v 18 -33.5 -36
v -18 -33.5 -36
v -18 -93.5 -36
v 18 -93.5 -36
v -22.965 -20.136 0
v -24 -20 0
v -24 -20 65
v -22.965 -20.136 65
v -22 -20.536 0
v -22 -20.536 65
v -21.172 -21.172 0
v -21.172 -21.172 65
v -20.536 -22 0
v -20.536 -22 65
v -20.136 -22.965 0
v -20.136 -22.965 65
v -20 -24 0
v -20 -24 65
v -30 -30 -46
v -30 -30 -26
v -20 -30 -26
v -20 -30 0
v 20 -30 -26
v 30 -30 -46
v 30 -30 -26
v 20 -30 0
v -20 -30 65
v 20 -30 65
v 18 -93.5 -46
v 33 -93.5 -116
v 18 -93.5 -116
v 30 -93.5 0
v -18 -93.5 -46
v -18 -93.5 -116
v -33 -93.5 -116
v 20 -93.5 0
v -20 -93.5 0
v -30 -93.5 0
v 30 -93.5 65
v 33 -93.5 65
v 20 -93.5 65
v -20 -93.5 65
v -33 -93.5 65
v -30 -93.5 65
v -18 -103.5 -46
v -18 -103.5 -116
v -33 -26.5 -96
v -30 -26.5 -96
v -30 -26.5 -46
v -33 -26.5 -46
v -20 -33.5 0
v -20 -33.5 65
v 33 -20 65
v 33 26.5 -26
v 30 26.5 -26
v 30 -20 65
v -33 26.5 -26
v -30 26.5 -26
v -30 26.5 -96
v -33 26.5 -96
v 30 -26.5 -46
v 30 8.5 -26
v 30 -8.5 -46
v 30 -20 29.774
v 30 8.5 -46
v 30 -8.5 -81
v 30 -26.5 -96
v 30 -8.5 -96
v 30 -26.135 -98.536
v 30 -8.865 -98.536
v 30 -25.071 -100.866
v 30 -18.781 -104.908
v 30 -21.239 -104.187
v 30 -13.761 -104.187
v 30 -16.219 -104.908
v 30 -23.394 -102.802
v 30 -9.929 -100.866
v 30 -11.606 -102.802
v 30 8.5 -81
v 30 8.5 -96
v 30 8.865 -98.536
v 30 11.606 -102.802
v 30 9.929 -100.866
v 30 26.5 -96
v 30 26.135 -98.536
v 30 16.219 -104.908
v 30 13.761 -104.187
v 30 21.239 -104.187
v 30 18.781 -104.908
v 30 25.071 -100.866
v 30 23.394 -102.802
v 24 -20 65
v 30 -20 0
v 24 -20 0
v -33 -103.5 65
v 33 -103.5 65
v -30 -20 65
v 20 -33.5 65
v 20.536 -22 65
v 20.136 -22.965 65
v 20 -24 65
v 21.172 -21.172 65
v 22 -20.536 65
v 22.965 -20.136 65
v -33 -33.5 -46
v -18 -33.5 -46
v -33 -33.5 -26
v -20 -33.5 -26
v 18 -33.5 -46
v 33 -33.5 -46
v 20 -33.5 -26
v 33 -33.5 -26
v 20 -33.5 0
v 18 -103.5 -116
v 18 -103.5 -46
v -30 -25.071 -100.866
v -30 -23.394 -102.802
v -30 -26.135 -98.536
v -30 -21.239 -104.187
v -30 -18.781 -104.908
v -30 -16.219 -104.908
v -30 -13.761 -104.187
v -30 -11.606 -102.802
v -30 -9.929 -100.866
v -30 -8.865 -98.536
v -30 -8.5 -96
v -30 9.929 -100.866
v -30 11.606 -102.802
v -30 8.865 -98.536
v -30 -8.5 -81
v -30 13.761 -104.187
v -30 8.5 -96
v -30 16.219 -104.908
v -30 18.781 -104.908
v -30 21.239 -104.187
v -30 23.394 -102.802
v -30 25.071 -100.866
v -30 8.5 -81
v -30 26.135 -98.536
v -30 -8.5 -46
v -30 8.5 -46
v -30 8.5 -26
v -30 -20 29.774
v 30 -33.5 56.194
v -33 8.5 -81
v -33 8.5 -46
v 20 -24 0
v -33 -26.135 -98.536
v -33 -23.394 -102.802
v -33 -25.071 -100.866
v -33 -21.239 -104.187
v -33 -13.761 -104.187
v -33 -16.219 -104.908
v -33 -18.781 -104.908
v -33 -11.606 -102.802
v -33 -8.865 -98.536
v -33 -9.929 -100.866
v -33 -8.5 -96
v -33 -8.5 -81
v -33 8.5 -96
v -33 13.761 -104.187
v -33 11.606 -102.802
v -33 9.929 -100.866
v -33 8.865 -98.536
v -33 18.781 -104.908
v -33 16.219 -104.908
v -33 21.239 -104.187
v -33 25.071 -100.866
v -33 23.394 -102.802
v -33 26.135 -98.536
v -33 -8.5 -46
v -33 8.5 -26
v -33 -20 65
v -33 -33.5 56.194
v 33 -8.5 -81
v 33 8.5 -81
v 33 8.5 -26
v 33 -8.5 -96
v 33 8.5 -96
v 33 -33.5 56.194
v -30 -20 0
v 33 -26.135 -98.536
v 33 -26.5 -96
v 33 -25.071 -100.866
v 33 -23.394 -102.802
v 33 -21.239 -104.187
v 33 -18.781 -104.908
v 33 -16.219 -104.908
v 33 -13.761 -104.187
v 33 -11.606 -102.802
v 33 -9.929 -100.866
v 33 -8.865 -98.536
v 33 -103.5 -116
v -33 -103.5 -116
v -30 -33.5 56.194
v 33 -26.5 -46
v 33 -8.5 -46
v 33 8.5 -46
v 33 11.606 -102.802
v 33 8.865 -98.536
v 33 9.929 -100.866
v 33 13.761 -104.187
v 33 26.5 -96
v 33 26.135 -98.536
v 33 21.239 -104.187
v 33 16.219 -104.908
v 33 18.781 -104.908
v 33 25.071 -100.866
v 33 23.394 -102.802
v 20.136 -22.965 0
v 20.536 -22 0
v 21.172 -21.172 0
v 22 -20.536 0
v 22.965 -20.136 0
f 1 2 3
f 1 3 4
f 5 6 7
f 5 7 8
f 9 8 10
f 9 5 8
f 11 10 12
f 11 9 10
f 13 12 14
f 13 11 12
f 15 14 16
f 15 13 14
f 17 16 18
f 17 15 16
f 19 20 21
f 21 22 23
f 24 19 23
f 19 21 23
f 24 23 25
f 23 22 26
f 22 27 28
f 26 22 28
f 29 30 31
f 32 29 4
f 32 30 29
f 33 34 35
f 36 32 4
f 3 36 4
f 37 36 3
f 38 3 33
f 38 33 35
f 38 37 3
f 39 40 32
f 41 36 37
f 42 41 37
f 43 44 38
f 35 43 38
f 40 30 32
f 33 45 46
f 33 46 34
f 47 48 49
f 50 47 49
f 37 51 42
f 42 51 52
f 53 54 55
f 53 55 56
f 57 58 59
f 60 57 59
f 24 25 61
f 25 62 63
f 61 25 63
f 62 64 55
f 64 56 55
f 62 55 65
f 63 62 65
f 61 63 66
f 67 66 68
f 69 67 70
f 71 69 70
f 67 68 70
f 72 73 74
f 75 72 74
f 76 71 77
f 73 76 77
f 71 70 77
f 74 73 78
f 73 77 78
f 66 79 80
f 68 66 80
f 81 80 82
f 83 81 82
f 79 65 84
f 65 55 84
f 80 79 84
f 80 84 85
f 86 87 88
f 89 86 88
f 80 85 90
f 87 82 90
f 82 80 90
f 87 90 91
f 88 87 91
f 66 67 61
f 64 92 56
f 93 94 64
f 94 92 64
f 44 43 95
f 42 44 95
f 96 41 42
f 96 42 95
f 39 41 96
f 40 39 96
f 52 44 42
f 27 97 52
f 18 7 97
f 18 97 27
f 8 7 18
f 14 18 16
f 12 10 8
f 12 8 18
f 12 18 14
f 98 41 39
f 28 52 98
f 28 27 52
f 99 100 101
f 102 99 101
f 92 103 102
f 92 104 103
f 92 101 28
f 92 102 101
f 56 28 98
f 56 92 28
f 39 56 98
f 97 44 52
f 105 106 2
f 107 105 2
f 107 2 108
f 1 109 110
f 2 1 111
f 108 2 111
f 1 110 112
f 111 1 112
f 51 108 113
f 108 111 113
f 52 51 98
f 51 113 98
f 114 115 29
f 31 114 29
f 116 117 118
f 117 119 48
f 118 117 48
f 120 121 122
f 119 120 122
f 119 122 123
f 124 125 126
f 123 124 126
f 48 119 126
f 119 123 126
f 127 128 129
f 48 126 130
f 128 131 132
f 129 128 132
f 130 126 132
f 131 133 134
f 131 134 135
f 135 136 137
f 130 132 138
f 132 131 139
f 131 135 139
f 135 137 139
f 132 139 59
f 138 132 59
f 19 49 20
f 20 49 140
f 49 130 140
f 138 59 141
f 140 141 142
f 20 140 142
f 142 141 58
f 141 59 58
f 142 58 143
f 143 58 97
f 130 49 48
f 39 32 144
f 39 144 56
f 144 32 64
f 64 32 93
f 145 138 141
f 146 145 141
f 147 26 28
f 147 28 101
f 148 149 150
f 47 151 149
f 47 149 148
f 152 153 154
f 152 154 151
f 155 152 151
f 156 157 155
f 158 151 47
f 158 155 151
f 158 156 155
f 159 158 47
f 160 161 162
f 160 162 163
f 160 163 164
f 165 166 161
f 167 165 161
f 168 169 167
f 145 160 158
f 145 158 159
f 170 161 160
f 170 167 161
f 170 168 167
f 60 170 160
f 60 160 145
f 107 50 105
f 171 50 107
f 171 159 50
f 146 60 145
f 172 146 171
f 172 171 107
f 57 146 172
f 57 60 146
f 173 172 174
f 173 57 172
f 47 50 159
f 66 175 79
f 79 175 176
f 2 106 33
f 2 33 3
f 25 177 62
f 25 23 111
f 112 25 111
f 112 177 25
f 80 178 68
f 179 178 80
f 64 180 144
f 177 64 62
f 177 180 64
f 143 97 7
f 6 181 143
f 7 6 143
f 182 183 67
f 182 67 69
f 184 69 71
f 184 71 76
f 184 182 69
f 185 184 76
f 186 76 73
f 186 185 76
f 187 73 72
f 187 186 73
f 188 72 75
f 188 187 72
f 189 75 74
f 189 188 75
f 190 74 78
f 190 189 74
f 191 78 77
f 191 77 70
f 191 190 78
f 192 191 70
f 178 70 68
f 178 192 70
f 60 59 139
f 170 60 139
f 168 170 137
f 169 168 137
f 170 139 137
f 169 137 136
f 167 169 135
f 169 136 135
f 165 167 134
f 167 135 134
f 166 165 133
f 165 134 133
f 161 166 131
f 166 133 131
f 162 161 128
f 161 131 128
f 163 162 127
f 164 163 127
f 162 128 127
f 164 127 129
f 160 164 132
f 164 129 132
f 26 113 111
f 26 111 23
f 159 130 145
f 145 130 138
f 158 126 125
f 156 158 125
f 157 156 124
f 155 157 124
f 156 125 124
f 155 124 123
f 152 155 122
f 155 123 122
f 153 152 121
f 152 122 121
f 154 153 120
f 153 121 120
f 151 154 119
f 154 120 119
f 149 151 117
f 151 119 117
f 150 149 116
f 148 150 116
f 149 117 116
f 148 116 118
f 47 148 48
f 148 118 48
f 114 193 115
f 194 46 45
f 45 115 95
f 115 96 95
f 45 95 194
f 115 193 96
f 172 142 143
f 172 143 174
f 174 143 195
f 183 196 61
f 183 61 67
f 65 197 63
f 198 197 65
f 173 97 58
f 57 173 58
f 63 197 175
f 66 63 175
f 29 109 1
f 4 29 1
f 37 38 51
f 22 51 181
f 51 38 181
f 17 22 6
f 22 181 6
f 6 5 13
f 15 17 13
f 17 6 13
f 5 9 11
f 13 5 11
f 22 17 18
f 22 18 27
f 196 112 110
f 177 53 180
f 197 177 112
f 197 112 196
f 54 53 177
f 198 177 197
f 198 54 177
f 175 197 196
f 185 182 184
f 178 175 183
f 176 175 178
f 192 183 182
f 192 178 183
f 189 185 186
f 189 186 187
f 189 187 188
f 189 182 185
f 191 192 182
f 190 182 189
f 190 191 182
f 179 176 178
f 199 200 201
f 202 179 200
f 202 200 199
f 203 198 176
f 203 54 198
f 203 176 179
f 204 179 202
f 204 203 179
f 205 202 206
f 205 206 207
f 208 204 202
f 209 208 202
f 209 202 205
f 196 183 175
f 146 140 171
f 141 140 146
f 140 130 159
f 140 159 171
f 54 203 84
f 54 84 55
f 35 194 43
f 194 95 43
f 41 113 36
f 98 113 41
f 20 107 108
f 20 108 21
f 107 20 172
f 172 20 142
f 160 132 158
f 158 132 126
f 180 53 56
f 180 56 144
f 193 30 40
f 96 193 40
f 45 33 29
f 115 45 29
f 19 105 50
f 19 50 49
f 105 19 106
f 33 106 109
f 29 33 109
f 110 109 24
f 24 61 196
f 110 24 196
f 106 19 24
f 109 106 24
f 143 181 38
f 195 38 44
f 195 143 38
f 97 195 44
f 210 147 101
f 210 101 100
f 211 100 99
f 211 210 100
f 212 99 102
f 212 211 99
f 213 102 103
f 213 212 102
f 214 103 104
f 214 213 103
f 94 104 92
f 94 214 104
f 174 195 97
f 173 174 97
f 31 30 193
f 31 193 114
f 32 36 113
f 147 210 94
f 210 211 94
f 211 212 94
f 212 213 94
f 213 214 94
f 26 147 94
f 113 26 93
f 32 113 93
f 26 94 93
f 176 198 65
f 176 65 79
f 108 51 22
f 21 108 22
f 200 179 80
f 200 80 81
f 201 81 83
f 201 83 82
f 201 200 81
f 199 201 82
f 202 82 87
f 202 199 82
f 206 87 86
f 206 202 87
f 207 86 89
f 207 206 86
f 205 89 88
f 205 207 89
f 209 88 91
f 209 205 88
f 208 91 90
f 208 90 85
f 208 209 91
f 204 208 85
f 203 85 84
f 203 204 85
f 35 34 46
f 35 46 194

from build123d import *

# Parameters (mm, degrees)
SKETCH_1_W      = 60
SKETCH_1_H      = 3
EXTRUDE_1_DEPTH = 65
SKETCH_2_W      = 40
SKETCH_2_H      = 3.5
EXTRUDE_2_DEPTH = 46
EXTRUDE_3_DEPTH = 3.5
SKETCH_5_W      = 35
SKETCH_5_H      = 17
EXTRUDE_4_DEPTH = 3
EXTRUDE_START   = 3
SKETCH_6_W      = 35
SKETCH_6_H      = 17
SKETCH_6_W_2    = 20
SKETCH_6_H_2    = 3.5
EXTRUDE_5_DEPTH = 3
SKETCH_7_W      = 36
SKETCH_7_H      = 10
SKETCH_7_W_2    = 10
SKETCH_7_H_2    = 65
EXTRUDE_6_DEPTH = 60
SKETCH_8_W      = 66
SKETCH_8_H      = 111
EXTRUDE_7_DEPTH = 10
SKETCH_9_W      = 15
SKETCH_9_H      = 10
EXTRUDE_8_DEPTH = 70


with BuildPart() as part:
    # 草图1 → 凸台-拉伸1 (new body)
    with BuildSketch(Plane.XY):
        with Locations((0, -32)):
            Rectangle(SKETCH_1_W, SKETCH_1_H)
        with BuildLine():
            Line((-20, -24), (-20, -28))
            Line((-20, -28), (-20, -30))
            Line((-20, -30), (20, -30))
            Line((20, -30), (20, -28))
            Line((20, -28), (20, -24))
            ThreePointArc((20, -24), (21.171572875, -21.171572875), (24, -20))
            Line((24, -20), (28, -20))
            Line((28, -20), (30, -20))
            Line((30, -20), (30, -30.5))
            Line((30, -30.5), (-30, -30.5))
            Line((-30, -30.5), (-30, -20))
            Line((-30, -20), (-28, -20))
            Line((-28, -20), (-24, -20))
            ThreePointArc((-24, -20), (-21.171572875, -21.171572875), (-20, -24))
        make_face()
    extrude(amount=EXTRUDE_1_DEPTH)

    # 草图2 → 凸台-拉伸2 (add)
    with BuildSketch(Plane(origin=(0, 0, 0), x_dir=(-1, 0, 0), z_dir=(0, 0, -1))):
        with Locations((0, -31.75)):
            Rectangle(SKETCH_2_W, SKETCH_2_H)
    extrude(amount=EXTRUDE_2_DEPTH)

    # 草图4 → 凸台-拉伸3 (add)
    with BuildSketch(Plane.XZ.offset(33.5)):
        Polygon((20, -46), (30, -46), (30, -26), (20, -26), (-30, -26), (-30, -46), align=None)
    extrude(amount=-EXTRUDE_3_DEPTH)

    # 草图5 → 凸台-拉伸4 (add)
    with BuildSketch(Plane.ZY.offset(30)):
        with BuildLine():
            Line((-46, -26.5), (-46, -33.5))
            Line((-46, -33.5), (-26, -33.5))
            Line((-26, -33.5), (-26, 8.5))
            Line((-26, 8.5), (56.193548387, -33.5))
            Line((56.193548387, -33.5), (65, -20))
            Line((65, -20), (-26, 26.5))
            Line((-26, 26.5), (-96, 26.5))
            ThreePointArc((-96, 26.5), (-105, 17.5), (-96, 8.5))
            Line((-96, 8.5), (-96, -8.5))
            ThreePointArc((-96, -8.5), (-105, -17.5), (-96, -26.5))
            Line((-96, -26.5), (-46, -26.5))
        make_face()
        with Locations((-63.5, 0)):
            Rectangle(SKETCH_5_W, SKETCH_5_H, mode=Mode.SUBTRACT)
    extrude(amount=EXTRUDE_4_DEPTH)

    # 草图6 → 凸台-拉伸5 (add)
    # profile 1 of 3: a face of its own
    with BuildSketch(Plane(origin=(30, 0, 0), x_dir=(0, 0, -1), z_dir=(1, 0, 0)).offset(EXTRUDE_START)):
        Polygon((26, 8.5), (26, 26.5), (-65, -20), (-56.193548387, -33.5), align=None)
    # profile 2 of 3: a face of its own
    with BuildSketch(Plane(origin=(30, 0, 0), x_dir=(0, 0, -1), z_dir=(1, 0, 0)).offset(EXTRUDE_START)):
        with BuildLine():
            Line((96, 26.5), (46, 26.5))
            Line((46, 26.5), (26, 26.5))
            Line((26, 26.5), (26, 8.5))
            Line((26, 8.5), (26, -30))
            Line((26, -30), (46, -30))
            Line((46, -30), (46, -26.5))
            Line((46, -26.5), (96, -26.5))
            ThreePointArc((96, -26.5), (105, -17.5), (96, -8.5))
            Line((96, -8.5), (96, 8.5))
            ThreePointArc((96, 8.5), (105, 17.5), (96, 26.5))
        make_face()
        with Locations((63.5, 0)):
            Rectangle(SKETCH_6_W, SKETCH_6_H, mode=Mode.SUBTRACT)
    # profile 3 of 3: a face of its own
    with BuildSketch(Plane(origin=(30, 0, 0), x_dir=(0, 0, -1), z_dir=(1, 0, 0)).offset(EXTRUDE_START)):
        with Locations((36, -31.75)):
            Rectangle(SKETCH_6_W_2, SKETCH_6_H_2)
    extrude(amount=-EXTRUDE_5_DEPTH)

    # 草图7 → 凸台-拉伸6 (add)
    with BuildSketch(Plane.XZ.offset(33.5)):
        with Locations((0, -41)):
            Rectangle(SKETCH_7_W, SKETCH_7_H)
        with Locations((-25, 32.5)):
            Rectangle(SKETCH_7_W_2, SKETCH_7_H_2)
        with Locations((25, 32.5)):
            Rectangle(SKETCH_7_W_2, SKETCH_7_H_2)
    extrude(amount=EXTRUDE_6_DEPTH)

    # 草图8 → 凸台-拉伸7 (add)
    with BuildSketch(Plane.XZ.offset(93.5)):
        with Locations((0, 9.5)):
            Rectangle(SKETCH_8_W, SKETCH_8_H)
    extrude(amount=EXTRUDE_7_DEPTH)

    # 草图9 → 凸台-拉伸8 (add)
    with BuildSketch(Plane(origin=(0, 0, -46), x_dir=(-1, 0, 0), z_dir=(0, 0, -1))):
        with Locations((25.5, -98.5)):
            Rectangle(SKETCH_9_W, SKETCH_9_H)
        with Locations((-25.5, -98.5)):
            Rectangle(SKETCH_9_W, SKETCH_9_H)
    extrude(amount=EXTRUDE_8_DEPTH)


solid = part.part
